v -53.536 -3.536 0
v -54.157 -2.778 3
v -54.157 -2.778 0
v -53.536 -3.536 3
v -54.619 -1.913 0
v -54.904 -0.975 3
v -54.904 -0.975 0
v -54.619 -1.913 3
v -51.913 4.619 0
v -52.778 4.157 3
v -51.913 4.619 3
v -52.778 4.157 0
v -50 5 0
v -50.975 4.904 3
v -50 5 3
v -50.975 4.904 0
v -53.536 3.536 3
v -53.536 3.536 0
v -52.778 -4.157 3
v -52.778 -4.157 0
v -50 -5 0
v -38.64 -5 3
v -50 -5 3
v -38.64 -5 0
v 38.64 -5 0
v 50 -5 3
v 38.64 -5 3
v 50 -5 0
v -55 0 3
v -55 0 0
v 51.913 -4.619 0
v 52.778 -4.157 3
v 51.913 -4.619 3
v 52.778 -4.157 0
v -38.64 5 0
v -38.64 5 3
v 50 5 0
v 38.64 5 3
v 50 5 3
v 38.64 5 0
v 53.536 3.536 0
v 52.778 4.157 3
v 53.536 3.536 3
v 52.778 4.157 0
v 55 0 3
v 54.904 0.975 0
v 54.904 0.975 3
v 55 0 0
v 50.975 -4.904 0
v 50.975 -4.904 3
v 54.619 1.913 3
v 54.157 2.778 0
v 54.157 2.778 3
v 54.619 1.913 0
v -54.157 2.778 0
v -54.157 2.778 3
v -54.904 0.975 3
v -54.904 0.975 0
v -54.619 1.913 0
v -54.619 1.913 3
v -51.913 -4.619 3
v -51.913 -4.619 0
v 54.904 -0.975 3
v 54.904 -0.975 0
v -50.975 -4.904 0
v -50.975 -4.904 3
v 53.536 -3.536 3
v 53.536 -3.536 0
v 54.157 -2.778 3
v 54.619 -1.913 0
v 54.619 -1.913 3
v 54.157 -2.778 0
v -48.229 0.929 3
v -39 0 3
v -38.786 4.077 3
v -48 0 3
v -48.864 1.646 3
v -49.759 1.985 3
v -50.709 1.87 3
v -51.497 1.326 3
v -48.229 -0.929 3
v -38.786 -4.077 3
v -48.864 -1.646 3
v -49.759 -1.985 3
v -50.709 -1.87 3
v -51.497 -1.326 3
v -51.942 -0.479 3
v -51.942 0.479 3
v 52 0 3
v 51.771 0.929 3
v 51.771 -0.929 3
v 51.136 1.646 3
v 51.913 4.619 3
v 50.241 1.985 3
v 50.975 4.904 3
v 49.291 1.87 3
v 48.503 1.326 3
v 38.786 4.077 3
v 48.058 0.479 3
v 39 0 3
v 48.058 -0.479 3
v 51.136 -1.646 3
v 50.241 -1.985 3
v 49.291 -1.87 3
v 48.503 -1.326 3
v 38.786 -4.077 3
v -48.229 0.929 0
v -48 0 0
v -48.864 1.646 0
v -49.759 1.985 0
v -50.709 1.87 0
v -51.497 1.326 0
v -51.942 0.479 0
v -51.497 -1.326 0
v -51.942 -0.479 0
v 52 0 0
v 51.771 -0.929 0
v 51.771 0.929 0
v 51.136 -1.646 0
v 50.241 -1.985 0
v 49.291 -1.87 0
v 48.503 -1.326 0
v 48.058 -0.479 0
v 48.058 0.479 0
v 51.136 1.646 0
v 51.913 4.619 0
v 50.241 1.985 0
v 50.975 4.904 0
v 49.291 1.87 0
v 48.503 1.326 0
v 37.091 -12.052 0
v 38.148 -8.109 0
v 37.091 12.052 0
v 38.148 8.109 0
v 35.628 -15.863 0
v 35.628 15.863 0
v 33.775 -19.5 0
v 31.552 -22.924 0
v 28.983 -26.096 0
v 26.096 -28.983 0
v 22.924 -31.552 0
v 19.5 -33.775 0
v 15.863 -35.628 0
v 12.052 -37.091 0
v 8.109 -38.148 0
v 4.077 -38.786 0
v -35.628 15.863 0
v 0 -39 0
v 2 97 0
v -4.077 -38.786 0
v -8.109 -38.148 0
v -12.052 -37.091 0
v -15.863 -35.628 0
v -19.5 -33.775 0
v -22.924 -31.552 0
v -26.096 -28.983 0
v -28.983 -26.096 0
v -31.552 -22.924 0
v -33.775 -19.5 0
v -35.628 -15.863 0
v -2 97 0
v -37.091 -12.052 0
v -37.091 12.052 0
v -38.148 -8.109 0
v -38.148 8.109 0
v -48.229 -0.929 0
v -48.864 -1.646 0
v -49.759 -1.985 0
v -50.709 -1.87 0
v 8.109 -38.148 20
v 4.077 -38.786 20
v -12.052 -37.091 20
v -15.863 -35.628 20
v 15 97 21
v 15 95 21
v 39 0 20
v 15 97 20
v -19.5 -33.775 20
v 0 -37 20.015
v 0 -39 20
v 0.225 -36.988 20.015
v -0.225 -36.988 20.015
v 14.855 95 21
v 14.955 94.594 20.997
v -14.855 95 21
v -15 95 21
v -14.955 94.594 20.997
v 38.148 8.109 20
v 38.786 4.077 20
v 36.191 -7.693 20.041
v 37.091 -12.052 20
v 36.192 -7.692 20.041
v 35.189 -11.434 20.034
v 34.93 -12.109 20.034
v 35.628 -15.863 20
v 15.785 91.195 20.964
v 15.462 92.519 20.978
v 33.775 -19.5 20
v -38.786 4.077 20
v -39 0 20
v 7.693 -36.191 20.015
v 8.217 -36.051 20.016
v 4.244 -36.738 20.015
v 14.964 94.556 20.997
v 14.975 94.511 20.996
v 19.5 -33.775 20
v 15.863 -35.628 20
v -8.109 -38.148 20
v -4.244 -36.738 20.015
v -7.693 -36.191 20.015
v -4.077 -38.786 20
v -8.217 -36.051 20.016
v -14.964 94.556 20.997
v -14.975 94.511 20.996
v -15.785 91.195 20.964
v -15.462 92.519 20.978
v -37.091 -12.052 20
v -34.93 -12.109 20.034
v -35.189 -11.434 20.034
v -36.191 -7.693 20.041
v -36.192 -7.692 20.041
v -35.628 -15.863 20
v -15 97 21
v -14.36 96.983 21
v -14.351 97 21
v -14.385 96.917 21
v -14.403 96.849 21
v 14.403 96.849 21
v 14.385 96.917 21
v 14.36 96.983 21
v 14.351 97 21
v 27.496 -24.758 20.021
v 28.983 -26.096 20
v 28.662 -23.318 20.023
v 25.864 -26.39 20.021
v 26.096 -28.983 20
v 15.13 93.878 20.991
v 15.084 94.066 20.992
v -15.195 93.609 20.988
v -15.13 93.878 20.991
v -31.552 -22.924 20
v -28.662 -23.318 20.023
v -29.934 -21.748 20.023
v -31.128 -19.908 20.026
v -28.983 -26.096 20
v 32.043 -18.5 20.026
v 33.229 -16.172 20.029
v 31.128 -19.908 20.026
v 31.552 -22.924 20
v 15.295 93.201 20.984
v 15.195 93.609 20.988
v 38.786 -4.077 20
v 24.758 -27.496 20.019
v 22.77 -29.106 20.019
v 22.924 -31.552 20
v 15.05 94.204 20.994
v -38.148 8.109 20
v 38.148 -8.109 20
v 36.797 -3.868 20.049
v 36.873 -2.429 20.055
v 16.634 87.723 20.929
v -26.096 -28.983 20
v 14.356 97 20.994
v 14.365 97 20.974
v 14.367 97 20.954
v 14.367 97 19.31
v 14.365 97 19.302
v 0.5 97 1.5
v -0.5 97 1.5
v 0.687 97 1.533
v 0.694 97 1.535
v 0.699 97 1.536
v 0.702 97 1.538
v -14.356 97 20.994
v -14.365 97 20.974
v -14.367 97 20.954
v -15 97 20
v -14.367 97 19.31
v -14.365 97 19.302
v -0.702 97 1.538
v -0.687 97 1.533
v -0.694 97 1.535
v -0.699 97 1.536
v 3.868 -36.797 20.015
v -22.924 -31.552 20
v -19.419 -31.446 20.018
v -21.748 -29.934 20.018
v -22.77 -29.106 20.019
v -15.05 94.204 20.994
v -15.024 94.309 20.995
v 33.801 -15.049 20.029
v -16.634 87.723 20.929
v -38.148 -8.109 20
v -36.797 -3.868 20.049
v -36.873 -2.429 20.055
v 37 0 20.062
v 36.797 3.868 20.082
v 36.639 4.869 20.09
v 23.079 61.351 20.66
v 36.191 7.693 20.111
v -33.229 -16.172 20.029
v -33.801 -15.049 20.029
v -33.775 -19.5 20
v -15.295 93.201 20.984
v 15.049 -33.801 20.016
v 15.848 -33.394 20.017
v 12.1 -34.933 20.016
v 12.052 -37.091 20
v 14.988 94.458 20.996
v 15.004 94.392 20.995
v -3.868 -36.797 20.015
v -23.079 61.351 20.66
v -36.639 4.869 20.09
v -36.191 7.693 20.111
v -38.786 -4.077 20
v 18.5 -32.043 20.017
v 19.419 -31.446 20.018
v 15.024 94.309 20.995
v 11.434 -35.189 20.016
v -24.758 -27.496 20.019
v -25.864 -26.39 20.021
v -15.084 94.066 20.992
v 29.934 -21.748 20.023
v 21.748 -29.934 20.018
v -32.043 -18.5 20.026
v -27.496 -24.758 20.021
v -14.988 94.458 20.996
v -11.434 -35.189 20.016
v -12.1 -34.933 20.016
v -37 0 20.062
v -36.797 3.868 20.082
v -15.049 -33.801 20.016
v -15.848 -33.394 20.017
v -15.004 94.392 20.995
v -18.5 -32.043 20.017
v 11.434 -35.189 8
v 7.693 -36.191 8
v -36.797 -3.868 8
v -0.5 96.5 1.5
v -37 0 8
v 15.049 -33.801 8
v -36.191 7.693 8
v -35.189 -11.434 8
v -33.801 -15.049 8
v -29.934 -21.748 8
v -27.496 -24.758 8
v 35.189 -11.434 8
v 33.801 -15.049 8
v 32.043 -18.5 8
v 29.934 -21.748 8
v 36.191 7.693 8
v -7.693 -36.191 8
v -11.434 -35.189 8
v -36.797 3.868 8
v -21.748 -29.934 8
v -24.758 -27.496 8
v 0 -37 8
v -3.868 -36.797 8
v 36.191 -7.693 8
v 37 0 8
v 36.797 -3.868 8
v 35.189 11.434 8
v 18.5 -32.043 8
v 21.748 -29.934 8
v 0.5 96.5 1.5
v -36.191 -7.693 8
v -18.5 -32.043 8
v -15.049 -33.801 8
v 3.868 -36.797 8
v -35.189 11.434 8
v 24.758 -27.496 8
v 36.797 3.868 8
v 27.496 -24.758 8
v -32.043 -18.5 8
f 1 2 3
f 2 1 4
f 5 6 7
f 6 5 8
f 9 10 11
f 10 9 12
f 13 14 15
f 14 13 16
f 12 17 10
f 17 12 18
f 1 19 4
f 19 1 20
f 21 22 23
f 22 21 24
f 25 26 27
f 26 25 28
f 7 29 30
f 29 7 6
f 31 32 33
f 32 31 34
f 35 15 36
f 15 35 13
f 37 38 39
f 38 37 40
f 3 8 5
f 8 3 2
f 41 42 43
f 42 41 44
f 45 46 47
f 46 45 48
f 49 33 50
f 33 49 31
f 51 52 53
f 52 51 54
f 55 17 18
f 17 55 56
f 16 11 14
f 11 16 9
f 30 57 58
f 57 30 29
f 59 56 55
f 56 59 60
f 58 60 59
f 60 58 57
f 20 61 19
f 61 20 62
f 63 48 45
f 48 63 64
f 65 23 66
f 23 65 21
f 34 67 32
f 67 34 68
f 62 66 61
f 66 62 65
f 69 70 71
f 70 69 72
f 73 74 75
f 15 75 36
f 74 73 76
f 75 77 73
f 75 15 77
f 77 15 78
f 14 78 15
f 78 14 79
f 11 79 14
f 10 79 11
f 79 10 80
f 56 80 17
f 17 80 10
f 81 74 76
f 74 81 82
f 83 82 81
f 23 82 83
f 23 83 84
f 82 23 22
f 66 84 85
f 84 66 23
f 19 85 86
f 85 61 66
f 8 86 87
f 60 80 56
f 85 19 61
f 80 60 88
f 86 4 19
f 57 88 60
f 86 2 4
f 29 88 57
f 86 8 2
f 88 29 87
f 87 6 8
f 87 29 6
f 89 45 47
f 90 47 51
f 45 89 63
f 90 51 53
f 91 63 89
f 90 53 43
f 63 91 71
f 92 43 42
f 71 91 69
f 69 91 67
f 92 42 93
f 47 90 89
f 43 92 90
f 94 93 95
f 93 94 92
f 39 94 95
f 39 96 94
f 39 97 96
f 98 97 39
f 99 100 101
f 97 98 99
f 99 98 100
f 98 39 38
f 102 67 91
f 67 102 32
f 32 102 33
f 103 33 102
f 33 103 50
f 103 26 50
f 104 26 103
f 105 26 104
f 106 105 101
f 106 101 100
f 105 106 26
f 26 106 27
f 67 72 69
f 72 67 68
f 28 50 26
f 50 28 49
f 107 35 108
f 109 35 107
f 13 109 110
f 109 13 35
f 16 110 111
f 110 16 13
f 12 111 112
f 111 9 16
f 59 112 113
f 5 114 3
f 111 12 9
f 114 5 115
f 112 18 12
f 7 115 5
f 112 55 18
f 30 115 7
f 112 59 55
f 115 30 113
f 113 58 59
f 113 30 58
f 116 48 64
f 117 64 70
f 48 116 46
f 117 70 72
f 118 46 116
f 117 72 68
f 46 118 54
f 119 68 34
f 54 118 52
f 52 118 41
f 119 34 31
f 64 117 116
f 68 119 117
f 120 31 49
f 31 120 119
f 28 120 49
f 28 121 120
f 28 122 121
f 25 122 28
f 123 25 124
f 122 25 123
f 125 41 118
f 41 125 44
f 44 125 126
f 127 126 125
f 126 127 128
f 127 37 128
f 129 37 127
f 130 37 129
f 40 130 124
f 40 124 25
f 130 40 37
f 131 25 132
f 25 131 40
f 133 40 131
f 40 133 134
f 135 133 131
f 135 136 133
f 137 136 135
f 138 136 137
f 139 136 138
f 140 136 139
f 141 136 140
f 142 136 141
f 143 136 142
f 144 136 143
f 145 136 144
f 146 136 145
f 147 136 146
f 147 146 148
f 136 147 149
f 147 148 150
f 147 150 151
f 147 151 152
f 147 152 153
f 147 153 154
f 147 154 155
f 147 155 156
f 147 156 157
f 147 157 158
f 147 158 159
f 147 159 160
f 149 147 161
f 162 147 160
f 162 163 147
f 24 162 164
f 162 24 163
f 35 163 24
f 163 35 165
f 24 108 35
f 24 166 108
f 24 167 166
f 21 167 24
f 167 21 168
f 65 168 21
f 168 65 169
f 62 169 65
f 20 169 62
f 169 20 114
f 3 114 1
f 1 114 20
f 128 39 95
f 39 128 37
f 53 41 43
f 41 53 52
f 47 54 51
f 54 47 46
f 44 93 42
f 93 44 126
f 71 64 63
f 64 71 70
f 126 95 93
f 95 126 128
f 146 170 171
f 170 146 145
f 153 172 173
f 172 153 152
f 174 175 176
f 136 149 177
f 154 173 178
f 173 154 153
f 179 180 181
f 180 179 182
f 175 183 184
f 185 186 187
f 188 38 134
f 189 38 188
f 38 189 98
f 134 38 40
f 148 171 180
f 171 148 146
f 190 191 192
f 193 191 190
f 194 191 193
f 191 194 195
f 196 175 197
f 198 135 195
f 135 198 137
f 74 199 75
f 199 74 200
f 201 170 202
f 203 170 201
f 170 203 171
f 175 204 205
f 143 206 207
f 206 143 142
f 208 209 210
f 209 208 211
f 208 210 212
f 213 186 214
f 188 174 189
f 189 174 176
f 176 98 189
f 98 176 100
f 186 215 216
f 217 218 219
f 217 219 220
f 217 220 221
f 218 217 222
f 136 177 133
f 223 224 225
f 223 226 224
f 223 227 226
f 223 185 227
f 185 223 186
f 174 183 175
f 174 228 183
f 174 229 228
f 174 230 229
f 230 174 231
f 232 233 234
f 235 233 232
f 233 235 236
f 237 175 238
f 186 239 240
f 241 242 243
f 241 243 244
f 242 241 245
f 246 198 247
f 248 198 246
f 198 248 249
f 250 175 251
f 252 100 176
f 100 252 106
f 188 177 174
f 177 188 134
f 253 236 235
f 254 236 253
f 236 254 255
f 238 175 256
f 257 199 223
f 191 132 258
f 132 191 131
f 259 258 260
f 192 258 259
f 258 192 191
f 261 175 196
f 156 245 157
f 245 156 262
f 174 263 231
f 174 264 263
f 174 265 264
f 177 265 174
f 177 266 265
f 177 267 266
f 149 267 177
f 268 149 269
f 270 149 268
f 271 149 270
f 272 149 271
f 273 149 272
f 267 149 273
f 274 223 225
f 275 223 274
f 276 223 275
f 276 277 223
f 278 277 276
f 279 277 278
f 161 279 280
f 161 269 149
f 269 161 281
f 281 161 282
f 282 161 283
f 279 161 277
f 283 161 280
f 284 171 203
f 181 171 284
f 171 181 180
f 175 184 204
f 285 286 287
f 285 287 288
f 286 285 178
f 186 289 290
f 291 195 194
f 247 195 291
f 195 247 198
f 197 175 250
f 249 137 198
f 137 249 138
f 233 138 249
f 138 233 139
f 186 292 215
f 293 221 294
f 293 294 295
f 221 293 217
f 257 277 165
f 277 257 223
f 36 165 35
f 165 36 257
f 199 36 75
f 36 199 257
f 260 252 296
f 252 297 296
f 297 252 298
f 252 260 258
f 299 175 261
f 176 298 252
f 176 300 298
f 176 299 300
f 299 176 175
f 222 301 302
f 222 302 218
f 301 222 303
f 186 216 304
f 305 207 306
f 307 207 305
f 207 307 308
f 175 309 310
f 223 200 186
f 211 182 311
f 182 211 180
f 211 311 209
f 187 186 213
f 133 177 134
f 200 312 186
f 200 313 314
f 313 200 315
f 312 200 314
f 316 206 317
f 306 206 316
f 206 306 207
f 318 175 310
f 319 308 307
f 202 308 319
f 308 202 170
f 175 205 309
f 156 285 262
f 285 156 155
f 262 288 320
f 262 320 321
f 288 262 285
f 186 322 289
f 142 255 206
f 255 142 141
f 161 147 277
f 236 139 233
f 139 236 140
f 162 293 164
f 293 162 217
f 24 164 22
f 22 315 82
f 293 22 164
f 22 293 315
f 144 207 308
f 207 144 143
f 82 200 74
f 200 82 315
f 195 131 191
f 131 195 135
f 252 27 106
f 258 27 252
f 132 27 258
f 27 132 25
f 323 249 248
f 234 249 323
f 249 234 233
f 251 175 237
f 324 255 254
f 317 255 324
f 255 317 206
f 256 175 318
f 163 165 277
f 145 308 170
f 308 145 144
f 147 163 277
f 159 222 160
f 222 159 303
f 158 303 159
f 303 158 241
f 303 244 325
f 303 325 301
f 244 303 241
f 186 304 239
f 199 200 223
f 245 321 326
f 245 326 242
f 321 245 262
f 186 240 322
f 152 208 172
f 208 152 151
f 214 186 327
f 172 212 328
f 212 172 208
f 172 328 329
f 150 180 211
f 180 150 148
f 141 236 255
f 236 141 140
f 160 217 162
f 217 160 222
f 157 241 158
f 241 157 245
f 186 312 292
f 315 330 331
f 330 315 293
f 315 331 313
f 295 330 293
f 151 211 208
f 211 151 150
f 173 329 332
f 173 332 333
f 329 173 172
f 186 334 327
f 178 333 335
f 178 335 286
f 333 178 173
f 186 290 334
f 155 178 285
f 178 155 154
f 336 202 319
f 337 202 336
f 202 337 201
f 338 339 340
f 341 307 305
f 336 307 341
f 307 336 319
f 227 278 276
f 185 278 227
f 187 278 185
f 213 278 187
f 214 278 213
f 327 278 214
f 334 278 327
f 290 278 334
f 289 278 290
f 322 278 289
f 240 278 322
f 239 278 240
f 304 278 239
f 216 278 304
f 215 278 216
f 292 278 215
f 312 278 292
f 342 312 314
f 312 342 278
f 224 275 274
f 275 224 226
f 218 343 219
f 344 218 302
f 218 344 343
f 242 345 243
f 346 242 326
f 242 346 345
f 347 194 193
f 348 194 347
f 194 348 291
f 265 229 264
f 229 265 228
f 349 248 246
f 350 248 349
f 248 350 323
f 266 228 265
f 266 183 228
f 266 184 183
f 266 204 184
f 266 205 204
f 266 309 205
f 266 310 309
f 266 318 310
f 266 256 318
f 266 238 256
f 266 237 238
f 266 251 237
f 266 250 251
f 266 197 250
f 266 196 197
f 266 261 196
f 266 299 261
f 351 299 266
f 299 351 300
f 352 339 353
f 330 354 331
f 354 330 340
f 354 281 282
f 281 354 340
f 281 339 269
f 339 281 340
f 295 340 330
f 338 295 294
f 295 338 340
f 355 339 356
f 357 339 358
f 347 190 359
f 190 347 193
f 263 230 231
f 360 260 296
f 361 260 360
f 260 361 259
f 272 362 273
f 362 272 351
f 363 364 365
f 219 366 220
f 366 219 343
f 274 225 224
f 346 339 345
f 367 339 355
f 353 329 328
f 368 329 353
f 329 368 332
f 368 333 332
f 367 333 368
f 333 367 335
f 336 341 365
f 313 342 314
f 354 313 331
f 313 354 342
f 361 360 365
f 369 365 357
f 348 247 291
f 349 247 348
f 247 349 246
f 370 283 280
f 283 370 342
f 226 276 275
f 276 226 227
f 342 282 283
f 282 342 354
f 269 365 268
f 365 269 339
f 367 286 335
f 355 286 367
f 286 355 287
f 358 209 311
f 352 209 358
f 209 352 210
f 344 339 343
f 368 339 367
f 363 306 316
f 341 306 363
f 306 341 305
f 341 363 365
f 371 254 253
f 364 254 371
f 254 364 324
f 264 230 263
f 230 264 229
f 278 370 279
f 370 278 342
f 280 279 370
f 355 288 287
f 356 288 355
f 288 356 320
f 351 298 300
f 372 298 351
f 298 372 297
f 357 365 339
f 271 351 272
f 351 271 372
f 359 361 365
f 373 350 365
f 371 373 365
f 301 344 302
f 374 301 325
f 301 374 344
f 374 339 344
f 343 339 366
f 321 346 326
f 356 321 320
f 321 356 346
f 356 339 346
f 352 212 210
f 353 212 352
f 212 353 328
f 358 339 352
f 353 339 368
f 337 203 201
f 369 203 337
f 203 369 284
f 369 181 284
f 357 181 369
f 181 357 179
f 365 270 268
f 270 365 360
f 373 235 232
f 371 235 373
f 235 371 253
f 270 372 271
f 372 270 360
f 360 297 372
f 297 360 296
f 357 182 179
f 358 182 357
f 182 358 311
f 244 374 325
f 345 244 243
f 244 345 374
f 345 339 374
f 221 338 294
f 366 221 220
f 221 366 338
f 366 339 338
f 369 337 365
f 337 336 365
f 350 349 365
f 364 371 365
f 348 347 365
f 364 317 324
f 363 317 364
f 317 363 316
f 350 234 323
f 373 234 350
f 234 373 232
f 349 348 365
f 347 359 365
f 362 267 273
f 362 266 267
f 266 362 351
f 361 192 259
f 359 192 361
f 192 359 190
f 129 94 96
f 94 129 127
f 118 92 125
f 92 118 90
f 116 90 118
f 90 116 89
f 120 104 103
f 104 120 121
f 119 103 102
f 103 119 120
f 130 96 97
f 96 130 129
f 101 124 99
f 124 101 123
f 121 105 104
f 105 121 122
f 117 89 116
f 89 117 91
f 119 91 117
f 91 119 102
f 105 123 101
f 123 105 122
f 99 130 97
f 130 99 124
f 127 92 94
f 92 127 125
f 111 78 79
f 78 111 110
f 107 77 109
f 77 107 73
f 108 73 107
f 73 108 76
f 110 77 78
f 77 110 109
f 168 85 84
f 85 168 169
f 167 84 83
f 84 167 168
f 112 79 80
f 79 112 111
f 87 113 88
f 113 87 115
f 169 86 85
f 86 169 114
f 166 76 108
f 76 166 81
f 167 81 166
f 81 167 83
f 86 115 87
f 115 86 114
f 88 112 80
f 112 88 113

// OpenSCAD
$fs=$fs/2;
$fa=$fa/2;

d = 120;
h1=12;
h2=5;


/*linear_extrude(height = h2, center = false, convexity = 10, twist = 360, $fn = 100){
        translate([d/2-3, 0, 0])
        circle(r = 3);
    }*/

module bol(){
    union(){
        cylinder(r=d/2, h=1);
        hull(){
            cylinder(r=6, h=h1);
            cylinder(r=d/2-5, h=1);
        }
        
        difference(){
            cylinder(r=d/2, h=h1);
            cylinder(r=d/2-1, h=h1+2);
        }
        
        
    }
}

module bol1(){
    union(){
        bol();

        for(i = [0:3500]){
             rotate([0,0,i/10]) translate([d/2-6, 0, 0]) cube([5,1,1+(i/3500)*5]);
        }
    }
}

module bol2(){
    %cube([150,150,4], center=true);
    difference(){union(){
            hull(){
                translate([50, 0, 0]) cylinder(r=5,3);
                translate([-50, 0, 0]) cylinder(r=5,3);
            }
            hull(){
                translate([0, 0, 0]) cylinder(r=78/2,20);
                translate([-15, 95, 20]) cube([30,2,1]);
                translate([-2, 95, 0]) cube([4,2,20]);
            }
        }
        hull(){
            translate([0, 0, 8]) cylinder(r=78/2-2,40);
            translate([0, 98, 20]) cube([28,1,1], center=true);
            translate([0, 97, 2]) cube([1,1,1], center=true);
        }
        translate([50, 0, 0]) cylinder(r=2,3);
        translate([-50, 0, 0]) cylinder(r=2,3);
    }
    
}


bol2();
